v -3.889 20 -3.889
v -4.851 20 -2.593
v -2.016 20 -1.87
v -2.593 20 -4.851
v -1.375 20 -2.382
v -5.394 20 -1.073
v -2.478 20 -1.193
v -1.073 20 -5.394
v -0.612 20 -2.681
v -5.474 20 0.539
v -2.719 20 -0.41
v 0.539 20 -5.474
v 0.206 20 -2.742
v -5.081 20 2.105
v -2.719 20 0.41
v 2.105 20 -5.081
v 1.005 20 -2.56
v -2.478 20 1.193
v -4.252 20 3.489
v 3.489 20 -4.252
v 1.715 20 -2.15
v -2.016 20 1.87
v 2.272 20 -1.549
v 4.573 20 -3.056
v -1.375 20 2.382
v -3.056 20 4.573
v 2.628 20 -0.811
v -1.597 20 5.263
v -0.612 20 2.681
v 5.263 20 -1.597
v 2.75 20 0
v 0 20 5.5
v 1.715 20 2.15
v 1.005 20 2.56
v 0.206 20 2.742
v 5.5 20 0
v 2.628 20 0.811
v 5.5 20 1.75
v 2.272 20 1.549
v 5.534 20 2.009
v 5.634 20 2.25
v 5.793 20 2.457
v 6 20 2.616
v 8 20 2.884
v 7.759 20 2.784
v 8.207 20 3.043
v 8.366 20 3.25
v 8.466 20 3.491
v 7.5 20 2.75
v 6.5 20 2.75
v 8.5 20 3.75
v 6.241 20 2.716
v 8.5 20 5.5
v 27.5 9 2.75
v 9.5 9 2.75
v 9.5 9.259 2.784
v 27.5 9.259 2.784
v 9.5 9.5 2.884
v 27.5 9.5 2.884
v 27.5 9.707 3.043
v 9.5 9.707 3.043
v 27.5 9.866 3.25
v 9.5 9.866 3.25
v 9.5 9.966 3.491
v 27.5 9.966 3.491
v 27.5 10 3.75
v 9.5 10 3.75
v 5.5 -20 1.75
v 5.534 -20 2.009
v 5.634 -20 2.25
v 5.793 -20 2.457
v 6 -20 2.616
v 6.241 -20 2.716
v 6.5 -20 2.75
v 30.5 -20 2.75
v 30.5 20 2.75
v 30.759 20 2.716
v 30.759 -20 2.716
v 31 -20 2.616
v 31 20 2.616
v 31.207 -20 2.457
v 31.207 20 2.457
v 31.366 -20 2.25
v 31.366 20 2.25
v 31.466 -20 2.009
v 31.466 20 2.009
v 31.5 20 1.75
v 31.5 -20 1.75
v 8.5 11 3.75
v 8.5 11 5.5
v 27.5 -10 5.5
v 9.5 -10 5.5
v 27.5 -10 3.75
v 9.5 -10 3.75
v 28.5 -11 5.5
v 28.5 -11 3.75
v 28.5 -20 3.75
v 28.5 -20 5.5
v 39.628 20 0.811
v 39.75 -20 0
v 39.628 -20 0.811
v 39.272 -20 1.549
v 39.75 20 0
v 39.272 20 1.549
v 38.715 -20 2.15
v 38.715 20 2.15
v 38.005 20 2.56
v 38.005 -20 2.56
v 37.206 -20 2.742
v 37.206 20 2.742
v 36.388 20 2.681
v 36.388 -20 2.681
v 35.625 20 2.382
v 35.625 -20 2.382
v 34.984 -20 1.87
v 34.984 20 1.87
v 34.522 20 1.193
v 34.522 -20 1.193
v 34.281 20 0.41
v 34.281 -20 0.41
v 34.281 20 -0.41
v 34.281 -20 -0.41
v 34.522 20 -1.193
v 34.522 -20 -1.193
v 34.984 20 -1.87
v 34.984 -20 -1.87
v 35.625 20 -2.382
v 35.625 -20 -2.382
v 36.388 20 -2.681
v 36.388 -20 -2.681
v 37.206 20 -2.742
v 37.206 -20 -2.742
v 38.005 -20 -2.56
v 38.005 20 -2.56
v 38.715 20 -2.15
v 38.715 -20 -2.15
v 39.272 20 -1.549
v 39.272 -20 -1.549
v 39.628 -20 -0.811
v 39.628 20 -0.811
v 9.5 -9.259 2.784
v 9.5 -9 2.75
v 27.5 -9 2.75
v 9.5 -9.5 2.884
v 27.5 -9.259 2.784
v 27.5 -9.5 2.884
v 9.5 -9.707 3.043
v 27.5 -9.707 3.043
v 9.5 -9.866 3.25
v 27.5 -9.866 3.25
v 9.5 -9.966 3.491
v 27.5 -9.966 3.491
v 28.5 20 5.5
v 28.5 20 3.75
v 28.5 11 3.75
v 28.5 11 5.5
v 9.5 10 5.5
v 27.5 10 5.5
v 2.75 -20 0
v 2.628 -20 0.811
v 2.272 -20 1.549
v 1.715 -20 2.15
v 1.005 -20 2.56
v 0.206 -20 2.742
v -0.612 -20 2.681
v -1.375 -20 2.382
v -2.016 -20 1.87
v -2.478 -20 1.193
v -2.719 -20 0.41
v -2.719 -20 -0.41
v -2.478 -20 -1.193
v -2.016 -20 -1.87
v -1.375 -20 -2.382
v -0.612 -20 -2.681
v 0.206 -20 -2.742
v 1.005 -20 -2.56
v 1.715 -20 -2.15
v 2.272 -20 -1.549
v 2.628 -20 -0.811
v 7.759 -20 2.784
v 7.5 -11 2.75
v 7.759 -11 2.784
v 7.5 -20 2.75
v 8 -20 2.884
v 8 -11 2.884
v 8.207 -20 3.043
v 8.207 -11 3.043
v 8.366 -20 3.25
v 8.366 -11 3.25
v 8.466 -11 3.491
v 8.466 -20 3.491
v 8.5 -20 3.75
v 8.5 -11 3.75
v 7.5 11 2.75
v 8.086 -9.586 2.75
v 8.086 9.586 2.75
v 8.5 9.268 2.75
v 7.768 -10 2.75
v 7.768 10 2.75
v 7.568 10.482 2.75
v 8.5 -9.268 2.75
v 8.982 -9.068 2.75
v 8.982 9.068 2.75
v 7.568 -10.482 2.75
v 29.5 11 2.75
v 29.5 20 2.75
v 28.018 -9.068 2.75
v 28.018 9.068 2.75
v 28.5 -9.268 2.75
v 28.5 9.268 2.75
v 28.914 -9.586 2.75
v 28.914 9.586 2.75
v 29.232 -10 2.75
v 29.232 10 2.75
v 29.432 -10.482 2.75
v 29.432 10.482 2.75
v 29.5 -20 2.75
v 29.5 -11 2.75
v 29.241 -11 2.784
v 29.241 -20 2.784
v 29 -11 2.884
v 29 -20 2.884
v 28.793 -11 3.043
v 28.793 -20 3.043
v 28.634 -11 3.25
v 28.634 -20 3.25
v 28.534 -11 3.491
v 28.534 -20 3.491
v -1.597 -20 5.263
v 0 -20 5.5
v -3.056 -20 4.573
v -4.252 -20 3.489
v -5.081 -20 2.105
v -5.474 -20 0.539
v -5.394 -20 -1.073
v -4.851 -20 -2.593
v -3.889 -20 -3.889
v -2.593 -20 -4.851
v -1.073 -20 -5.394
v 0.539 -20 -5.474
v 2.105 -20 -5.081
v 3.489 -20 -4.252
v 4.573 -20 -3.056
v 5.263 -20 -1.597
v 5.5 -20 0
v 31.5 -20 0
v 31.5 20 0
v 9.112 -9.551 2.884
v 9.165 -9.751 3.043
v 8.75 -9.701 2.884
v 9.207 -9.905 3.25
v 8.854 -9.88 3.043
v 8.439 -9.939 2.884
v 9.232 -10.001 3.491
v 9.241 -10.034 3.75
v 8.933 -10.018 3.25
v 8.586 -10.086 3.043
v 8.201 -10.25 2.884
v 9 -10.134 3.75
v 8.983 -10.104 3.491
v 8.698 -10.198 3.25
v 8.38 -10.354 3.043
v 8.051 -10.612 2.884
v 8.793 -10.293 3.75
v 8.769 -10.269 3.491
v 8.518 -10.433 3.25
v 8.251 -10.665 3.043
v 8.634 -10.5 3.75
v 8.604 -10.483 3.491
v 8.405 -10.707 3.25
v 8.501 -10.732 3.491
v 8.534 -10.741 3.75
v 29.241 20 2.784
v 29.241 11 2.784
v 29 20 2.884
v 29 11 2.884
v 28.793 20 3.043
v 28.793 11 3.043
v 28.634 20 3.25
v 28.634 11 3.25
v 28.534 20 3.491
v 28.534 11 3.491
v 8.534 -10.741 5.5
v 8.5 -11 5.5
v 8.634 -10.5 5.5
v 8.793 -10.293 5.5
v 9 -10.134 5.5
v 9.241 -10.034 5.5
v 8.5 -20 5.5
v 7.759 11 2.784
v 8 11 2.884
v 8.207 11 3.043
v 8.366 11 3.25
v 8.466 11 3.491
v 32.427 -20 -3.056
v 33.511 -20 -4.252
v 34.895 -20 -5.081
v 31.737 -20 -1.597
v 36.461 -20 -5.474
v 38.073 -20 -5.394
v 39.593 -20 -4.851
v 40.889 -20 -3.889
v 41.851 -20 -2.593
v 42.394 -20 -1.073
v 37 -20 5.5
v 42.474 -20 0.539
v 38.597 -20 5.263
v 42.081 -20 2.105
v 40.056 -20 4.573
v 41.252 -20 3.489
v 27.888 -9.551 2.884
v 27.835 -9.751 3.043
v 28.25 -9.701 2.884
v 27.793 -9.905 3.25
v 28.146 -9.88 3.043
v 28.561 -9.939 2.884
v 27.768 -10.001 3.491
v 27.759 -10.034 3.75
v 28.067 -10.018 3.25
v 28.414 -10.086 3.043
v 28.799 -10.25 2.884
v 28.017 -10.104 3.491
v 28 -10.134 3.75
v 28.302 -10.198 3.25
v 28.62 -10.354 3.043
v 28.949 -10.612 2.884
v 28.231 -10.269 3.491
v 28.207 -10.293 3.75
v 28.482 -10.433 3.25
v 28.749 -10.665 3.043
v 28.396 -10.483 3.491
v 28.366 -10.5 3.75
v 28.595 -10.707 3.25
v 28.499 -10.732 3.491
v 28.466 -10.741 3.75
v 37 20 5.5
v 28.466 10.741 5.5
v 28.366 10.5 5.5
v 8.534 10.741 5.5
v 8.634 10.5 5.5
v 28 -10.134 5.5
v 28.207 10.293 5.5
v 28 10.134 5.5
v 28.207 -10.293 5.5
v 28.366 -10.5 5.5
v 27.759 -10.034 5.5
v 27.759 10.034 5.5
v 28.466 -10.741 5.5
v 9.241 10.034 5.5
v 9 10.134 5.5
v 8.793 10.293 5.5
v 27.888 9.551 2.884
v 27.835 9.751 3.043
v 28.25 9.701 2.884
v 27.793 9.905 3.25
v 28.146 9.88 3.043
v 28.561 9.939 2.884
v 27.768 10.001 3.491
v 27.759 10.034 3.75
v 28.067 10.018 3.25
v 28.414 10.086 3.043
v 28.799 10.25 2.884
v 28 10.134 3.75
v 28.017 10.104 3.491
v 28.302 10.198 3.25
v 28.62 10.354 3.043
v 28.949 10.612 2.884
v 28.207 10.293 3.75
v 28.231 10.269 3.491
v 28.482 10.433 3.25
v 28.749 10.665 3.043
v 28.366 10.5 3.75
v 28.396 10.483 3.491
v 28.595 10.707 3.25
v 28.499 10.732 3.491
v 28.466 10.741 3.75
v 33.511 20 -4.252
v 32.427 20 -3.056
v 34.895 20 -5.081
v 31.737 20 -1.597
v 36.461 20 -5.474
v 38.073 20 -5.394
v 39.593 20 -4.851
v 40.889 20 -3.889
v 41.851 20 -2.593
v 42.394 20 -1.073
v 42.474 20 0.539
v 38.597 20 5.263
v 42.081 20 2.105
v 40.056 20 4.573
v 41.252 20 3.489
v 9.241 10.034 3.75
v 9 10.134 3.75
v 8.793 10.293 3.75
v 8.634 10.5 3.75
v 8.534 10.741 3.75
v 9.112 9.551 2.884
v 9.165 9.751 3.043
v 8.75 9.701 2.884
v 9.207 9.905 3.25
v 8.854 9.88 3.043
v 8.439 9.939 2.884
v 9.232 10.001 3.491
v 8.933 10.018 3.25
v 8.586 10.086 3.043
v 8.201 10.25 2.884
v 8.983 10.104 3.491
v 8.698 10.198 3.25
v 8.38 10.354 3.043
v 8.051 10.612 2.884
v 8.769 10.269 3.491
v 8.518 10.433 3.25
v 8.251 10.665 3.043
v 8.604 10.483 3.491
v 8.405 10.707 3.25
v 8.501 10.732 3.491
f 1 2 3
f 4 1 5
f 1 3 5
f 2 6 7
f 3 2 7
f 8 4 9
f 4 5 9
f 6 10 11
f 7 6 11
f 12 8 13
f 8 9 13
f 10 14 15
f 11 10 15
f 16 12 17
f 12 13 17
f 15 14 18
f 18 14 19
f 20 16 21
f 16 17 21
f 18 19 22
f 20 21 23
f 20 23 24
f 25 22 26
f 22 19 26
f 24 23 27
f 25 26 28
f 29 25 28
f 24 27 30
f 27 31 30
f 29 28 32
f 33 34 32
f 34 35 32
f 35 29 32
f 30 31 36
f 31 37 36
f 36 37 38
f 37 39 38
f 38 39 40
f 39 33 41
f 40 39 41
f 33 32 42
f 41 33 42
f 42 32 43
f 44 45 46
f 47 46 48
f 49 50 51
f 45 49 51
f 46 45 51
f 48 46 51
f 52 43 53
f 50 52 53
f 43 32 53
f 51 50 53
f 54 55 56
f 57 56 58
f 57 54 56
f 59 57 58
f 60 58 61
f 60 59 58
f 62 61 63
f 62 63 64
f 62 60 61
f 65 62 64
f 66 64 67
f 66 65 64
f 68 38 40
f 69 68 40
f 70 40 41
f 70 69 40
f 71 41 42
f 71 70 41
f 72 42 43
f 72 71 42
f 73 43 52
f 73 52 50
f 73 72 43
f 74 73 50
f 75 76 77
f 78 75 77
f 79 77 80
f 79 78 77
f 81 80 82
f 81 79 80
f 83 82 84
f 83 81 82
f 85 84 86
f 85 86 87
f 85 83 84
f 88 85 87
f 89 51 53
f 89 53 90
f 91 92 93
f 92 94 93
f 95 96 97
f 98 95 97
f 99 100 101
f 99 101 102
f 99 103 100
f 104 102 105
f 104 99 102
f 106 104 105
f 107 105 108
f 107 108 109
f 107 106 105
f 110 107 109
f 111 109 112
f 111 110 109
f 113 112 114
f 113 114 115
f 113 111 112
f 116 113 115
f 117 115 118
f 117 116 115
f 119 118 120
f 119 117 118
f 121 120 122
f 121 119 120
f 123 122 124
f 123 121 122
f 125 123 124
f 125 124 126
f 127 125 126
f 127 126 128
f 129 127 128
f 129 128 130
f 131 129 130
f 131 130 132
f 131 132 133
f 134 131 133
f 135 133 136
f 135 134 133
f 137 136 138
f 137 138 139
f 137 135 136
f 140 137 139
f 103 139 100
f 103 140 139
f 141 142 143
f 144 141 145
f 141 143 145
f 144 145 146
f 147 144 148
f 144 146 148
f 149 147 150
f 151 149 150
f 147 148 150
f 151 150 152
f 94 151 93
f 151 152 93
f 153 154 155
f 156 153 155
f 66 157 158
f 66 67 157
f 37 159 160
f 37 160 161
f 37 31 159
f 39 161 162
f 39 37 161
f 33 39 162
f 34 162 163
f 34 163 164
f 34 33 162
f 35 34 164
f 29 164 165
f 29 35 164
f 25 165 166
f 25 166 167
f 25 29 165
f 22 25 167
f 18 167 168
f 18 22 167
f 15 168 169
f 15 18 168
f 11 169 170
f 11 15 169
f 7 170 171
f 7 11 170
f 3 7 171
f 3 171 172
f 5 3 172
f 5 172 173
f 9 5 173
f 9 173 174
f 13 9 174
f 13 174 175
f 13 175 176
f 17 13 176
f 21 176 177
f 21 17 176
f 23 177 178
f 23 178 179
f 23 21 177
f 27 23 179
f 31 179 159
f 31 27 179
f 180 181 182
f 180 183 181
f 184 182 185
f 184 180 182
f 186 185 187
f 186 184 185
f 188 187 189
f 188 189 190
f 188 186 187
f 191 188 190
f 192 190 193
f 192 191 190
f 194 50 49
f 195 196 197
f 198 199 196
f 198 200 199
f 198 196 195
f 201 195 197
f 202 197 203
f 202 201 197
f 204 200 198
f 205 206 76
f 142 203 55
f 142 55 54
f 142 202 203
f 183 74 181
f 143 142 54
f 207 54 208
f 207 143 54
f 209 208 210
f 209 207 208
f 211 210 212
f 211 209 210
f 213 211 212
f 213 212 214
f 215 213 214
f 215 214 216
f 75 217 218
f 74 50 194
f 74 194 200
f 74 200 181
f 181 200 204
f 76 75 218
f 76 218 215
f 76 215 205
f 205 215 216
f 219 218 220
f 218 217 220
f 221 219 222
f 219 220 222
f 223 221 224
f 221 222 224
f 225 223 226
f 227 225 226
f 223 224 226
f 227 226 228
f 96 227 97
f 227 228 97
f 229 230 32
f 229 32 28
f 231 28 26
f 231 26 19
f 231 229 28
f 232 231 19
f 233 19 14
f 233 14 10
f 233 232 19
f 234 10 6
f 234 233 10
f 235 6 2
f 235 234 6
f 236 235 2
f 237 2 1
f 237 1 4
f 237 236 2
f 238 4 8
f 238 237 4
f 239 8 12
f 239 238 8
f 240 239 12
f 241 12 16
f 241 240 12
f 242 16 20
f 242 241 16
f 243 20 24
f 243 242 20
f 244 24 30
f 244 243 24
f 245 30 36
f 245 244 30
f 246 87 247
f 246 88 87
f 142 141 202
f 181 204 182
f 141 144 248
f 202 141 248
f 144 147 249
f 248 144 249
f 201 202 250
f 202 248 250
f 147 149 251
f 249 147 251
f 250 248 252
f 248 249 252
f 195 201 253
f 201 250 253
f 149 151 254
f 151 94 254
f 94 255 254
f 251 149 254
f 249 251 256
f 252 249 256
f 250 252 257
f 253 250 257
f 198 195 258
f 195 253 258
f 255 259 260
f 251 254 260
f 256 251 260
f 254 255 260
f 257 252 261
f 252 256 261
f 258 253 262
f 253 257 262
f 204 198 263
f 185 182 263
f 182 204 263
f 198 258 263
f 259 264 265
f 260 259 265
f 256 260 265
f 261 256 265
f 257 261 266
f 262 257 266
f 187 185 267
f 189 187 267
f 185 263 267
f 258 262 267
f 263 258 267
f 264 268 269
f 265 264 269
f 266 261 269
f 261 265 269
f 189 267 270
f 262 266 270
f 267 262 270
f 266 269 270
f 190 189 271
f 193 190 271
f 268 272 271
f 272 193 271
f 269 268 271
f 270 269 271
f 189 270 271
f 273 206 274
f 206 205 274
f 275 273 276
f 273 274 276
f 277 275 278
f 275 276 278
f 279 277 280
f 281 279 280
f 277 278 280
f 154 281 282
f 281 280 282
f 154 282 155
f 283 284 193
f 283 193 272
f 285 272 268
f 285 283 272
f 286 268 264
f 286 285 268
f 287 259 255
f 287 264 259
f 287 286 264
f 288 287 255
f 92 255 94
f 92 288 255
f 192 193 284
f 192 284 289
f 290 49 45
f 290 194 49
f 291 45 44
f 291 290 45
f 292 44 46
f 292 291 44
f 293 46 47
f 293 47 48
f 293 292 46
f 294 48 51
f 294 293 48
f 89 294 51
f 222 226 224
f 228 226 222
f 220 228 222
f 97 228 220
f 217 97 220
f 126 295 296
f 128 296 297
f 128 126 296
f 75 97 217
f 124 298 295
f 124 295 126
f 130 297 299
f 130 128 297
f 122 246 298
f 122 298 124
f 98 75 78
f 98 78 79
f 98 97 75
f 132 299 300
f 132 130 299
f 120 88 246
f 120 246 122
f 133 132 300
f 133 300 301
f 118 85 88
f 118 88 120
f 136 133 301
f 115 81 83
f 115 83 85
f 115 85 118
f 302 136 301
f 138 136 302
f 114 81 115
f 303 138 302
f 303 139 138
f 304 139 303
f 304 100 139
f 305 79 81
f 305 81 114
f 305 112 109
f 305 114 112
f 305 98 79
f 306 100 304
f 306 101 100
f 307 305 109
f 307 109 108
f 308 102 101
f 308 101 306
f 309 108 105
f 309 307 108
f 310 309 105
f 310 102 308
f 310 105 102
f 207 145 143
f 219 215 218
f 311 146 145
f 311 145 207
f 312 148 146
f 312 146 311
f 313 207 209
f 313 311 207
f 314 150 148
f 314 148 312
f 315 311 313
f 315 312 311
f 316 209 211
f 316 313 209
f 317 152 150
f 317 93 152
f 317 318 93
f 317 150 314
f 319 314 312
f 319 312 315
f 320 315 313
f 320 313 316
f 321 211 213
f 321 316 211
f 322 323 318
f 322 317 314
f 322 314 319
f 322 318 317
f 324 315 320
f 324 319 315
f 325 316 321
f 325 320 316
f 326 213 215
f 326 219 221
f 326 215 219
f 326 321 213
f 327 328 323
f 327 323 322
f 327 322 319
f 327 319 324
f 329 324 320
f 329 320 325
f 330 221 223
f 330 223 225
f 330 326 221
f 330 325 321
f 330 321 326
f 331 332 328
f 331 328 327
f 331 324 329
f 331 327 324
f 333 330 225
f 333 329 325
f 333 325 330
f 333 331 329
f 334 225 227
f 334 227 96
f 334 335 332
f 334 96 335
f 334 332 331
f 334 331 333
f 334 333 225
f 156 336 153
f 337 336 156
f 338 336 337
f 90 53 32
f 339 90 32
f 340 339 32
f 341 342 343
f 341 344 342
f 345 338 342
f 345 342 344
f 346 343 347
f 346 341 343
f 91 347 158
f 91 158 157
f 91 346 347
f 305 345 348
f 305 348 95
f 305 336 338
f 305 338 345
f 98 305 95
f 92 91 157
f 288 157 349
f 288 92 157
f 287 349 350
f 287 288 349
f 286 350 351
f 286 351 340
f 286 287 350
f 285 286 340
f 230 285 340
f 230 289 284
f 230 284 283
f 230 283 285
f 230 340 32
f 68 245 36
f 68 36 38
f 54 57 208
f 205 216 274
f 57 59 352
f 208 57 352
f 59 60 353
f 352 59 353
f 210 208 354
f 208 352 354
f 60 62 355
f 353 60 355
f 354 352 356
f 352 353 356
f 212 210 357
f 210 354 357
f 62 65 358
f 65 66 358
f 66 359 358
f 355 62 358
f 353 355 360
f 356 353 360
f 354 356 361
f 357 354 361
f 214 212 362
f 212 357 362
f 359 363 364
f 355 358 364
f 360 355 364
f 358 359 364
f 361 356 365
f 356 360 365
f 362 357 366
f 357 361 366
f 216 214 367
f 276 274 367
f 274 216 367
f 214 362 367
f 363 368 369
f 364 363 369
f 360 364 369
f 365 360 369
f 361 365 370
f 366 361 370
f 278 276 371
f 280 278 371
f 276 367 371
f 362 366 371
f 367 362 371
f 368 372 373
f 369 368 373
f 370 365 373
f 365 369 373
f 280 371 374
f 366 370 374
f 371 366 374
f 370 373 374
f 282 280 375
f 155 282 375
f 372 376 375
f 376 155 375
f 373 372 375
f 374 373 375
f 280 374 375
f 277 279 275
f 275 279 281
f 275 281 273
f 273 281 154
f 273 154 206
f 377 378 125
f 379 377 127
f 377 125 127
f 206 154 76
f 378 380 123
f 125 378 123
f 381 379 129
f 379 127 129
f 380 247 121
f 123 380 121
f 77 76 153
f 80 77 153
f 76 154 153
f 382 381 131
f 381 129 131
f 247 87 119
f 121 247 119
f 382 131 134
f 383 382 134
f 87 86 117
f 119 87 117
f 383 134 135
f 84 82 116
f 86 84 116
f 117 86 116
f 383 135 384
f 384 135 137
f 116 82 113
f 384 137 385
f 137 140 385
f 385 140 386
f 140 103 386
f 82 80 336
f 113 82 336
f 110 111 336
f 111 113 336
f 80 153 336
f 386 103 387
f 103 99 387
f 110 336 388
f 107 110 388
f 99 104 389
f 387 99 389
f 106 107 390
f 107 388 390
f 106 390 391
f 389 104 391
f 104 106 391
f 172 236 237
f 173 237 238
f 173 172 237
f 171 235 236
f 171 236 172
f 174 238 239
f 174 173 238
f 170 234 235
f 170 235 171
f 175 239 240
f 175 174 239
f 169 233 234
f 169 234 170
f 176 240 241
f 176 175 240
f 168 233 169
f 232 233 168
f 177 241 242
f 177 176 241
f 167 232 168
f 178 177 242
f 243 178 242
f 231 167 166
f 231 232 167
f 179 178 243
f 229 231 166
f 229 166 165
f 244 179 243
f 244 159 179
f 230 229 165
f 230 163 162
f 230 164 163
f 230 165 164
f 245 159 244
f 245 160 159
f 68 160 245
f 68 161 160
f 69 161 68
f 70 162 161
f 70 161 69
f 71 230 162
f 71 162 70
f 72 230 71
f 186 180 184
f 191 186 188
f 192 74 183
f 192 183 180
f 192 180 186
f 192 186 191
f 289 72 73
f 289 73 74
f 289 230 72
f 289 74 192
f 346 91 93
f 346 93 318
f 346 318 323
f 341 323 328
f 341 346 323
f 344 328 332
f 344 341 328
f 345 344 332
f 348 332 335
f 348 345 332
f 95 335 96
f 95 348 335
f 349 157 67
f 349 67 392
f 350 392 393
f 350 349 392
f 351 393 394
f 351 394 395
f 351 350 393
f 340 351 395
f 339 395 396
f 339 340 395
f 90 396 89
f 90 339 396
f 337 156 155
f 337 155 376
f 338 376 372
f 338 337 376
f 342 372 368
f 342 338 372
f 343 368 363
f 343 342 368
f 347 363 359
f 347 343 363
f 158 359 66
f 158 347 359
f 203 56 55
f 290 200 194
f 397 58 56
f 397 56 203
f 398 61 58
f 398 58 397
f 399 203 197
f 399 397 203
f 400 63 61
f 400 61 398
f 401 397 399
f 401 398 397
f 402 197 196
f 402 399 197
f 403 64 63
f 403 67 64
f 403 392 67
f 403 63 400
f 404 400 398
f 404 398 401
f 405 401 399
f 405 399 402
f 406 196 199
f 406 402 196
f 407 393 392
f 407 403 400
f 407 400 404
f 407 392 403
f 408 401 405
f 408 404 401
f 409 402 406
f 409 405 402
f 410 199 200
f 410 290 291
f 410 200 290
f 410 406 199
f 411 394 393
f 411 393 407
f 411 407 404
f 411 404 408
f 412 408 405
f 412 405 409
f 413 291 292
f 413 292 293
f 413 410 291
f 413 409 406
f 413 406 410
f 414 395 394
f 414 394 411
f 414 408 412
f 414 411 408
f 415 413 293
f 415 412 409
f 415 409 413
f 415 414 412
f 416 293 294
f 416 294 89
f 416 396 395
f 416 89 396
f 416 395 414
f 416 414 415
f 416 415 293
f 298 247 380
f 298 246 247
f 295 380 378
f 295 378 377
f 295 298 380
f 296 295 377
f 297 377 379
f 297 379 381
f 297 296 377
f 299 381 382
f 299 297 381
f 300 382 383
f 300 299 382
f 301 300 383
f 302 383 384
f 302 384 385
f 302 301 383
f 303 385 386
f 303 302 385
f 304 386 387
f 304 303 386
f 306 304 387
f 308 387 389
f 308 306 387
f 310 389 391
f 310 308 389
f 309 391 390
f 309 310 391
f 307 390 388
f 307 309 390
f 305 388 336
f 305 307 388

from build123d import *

# Parameters (mm, degrees)
F0_R          = 2.75
F1_DEPTH      = 20
F1_DEPTH_BACK = 20
F2_W          = 20
F2_H          = 10
F3_DEPTH      = 2.75
F4_R          = 1


with BuildPart() as f1:
    # F0 (on Front) → F1 (new body, two sides)
    with BuildSketch(Plane.XZ) as f1_sk:
        with BuildLine():
            Line((37, 5.5), (0, 5.5))
            ThreePointArc((0, 5.5), (-3.8890872965, -3.8890872965), (5.5, 0))
            Line((5.5, 0), (5.5, 1.75))
            ThreePointArc((5.5, 1.75), (5.7928932188, 2.4571067812), (6.5, 2.75))
            Line((6.5, 2.75), (30.5, 2.75))
            ThreePointArc((30.5, 2.75), (31.2071067812, 2.4571067812), (31.5, 1.75))
            Line((31.5, 1.75), (31.5, 0))
            ThreePointArc((31.5, 0), (40.8890872965, -3.8890872965), (37, 5.5))
        make_face()
        Circle(F0_R, mode=Mode.SUBTRACT)
        with Locations((37, 0)):
            Circle(F0_R, mode=Mode.SUBTRACT)
    extrude(amount=F1_DEPTH)
    extrude(f1_sk.sketch, amount=-F1_DEPTH_BACK)

    # F2 (on face) → F3 (cut, through all)
    with BuildSketch(Plane(origin=(0, 0, 2.75), x_dir=(1, 0, 0), z_dir=(0, 0, -1))):
        with Locations((18.5, -15)):
            Rectangle(F2_W, F2_H)
        with Locations((18.5, 15)):
            Rectangle(F2_W, F2_H)
    extrude(amount=-F3_DEPTH, mode=Mode.SUBTRACT)

    # F4
    f4_edges = [f1.edges().sort_by_distance(p)[0] for p in [
        (8.5, -15, 2.75),
        (8.5, 15, 2.75),
        (28.5, 15, 2.75),
        (28.5, -15, 2.75),
        (8.5, -10, 4.125),
        (28.5, -10, 4.125),
        (28.5, 10, 4.125),
        (8.5, 10, 4.125),
        (18.5, 10, 2.75),
        (18.5, -10, 2.75),
    ]]
    fillet(f4_edges, radius=F4_R)


solid = f1.part
